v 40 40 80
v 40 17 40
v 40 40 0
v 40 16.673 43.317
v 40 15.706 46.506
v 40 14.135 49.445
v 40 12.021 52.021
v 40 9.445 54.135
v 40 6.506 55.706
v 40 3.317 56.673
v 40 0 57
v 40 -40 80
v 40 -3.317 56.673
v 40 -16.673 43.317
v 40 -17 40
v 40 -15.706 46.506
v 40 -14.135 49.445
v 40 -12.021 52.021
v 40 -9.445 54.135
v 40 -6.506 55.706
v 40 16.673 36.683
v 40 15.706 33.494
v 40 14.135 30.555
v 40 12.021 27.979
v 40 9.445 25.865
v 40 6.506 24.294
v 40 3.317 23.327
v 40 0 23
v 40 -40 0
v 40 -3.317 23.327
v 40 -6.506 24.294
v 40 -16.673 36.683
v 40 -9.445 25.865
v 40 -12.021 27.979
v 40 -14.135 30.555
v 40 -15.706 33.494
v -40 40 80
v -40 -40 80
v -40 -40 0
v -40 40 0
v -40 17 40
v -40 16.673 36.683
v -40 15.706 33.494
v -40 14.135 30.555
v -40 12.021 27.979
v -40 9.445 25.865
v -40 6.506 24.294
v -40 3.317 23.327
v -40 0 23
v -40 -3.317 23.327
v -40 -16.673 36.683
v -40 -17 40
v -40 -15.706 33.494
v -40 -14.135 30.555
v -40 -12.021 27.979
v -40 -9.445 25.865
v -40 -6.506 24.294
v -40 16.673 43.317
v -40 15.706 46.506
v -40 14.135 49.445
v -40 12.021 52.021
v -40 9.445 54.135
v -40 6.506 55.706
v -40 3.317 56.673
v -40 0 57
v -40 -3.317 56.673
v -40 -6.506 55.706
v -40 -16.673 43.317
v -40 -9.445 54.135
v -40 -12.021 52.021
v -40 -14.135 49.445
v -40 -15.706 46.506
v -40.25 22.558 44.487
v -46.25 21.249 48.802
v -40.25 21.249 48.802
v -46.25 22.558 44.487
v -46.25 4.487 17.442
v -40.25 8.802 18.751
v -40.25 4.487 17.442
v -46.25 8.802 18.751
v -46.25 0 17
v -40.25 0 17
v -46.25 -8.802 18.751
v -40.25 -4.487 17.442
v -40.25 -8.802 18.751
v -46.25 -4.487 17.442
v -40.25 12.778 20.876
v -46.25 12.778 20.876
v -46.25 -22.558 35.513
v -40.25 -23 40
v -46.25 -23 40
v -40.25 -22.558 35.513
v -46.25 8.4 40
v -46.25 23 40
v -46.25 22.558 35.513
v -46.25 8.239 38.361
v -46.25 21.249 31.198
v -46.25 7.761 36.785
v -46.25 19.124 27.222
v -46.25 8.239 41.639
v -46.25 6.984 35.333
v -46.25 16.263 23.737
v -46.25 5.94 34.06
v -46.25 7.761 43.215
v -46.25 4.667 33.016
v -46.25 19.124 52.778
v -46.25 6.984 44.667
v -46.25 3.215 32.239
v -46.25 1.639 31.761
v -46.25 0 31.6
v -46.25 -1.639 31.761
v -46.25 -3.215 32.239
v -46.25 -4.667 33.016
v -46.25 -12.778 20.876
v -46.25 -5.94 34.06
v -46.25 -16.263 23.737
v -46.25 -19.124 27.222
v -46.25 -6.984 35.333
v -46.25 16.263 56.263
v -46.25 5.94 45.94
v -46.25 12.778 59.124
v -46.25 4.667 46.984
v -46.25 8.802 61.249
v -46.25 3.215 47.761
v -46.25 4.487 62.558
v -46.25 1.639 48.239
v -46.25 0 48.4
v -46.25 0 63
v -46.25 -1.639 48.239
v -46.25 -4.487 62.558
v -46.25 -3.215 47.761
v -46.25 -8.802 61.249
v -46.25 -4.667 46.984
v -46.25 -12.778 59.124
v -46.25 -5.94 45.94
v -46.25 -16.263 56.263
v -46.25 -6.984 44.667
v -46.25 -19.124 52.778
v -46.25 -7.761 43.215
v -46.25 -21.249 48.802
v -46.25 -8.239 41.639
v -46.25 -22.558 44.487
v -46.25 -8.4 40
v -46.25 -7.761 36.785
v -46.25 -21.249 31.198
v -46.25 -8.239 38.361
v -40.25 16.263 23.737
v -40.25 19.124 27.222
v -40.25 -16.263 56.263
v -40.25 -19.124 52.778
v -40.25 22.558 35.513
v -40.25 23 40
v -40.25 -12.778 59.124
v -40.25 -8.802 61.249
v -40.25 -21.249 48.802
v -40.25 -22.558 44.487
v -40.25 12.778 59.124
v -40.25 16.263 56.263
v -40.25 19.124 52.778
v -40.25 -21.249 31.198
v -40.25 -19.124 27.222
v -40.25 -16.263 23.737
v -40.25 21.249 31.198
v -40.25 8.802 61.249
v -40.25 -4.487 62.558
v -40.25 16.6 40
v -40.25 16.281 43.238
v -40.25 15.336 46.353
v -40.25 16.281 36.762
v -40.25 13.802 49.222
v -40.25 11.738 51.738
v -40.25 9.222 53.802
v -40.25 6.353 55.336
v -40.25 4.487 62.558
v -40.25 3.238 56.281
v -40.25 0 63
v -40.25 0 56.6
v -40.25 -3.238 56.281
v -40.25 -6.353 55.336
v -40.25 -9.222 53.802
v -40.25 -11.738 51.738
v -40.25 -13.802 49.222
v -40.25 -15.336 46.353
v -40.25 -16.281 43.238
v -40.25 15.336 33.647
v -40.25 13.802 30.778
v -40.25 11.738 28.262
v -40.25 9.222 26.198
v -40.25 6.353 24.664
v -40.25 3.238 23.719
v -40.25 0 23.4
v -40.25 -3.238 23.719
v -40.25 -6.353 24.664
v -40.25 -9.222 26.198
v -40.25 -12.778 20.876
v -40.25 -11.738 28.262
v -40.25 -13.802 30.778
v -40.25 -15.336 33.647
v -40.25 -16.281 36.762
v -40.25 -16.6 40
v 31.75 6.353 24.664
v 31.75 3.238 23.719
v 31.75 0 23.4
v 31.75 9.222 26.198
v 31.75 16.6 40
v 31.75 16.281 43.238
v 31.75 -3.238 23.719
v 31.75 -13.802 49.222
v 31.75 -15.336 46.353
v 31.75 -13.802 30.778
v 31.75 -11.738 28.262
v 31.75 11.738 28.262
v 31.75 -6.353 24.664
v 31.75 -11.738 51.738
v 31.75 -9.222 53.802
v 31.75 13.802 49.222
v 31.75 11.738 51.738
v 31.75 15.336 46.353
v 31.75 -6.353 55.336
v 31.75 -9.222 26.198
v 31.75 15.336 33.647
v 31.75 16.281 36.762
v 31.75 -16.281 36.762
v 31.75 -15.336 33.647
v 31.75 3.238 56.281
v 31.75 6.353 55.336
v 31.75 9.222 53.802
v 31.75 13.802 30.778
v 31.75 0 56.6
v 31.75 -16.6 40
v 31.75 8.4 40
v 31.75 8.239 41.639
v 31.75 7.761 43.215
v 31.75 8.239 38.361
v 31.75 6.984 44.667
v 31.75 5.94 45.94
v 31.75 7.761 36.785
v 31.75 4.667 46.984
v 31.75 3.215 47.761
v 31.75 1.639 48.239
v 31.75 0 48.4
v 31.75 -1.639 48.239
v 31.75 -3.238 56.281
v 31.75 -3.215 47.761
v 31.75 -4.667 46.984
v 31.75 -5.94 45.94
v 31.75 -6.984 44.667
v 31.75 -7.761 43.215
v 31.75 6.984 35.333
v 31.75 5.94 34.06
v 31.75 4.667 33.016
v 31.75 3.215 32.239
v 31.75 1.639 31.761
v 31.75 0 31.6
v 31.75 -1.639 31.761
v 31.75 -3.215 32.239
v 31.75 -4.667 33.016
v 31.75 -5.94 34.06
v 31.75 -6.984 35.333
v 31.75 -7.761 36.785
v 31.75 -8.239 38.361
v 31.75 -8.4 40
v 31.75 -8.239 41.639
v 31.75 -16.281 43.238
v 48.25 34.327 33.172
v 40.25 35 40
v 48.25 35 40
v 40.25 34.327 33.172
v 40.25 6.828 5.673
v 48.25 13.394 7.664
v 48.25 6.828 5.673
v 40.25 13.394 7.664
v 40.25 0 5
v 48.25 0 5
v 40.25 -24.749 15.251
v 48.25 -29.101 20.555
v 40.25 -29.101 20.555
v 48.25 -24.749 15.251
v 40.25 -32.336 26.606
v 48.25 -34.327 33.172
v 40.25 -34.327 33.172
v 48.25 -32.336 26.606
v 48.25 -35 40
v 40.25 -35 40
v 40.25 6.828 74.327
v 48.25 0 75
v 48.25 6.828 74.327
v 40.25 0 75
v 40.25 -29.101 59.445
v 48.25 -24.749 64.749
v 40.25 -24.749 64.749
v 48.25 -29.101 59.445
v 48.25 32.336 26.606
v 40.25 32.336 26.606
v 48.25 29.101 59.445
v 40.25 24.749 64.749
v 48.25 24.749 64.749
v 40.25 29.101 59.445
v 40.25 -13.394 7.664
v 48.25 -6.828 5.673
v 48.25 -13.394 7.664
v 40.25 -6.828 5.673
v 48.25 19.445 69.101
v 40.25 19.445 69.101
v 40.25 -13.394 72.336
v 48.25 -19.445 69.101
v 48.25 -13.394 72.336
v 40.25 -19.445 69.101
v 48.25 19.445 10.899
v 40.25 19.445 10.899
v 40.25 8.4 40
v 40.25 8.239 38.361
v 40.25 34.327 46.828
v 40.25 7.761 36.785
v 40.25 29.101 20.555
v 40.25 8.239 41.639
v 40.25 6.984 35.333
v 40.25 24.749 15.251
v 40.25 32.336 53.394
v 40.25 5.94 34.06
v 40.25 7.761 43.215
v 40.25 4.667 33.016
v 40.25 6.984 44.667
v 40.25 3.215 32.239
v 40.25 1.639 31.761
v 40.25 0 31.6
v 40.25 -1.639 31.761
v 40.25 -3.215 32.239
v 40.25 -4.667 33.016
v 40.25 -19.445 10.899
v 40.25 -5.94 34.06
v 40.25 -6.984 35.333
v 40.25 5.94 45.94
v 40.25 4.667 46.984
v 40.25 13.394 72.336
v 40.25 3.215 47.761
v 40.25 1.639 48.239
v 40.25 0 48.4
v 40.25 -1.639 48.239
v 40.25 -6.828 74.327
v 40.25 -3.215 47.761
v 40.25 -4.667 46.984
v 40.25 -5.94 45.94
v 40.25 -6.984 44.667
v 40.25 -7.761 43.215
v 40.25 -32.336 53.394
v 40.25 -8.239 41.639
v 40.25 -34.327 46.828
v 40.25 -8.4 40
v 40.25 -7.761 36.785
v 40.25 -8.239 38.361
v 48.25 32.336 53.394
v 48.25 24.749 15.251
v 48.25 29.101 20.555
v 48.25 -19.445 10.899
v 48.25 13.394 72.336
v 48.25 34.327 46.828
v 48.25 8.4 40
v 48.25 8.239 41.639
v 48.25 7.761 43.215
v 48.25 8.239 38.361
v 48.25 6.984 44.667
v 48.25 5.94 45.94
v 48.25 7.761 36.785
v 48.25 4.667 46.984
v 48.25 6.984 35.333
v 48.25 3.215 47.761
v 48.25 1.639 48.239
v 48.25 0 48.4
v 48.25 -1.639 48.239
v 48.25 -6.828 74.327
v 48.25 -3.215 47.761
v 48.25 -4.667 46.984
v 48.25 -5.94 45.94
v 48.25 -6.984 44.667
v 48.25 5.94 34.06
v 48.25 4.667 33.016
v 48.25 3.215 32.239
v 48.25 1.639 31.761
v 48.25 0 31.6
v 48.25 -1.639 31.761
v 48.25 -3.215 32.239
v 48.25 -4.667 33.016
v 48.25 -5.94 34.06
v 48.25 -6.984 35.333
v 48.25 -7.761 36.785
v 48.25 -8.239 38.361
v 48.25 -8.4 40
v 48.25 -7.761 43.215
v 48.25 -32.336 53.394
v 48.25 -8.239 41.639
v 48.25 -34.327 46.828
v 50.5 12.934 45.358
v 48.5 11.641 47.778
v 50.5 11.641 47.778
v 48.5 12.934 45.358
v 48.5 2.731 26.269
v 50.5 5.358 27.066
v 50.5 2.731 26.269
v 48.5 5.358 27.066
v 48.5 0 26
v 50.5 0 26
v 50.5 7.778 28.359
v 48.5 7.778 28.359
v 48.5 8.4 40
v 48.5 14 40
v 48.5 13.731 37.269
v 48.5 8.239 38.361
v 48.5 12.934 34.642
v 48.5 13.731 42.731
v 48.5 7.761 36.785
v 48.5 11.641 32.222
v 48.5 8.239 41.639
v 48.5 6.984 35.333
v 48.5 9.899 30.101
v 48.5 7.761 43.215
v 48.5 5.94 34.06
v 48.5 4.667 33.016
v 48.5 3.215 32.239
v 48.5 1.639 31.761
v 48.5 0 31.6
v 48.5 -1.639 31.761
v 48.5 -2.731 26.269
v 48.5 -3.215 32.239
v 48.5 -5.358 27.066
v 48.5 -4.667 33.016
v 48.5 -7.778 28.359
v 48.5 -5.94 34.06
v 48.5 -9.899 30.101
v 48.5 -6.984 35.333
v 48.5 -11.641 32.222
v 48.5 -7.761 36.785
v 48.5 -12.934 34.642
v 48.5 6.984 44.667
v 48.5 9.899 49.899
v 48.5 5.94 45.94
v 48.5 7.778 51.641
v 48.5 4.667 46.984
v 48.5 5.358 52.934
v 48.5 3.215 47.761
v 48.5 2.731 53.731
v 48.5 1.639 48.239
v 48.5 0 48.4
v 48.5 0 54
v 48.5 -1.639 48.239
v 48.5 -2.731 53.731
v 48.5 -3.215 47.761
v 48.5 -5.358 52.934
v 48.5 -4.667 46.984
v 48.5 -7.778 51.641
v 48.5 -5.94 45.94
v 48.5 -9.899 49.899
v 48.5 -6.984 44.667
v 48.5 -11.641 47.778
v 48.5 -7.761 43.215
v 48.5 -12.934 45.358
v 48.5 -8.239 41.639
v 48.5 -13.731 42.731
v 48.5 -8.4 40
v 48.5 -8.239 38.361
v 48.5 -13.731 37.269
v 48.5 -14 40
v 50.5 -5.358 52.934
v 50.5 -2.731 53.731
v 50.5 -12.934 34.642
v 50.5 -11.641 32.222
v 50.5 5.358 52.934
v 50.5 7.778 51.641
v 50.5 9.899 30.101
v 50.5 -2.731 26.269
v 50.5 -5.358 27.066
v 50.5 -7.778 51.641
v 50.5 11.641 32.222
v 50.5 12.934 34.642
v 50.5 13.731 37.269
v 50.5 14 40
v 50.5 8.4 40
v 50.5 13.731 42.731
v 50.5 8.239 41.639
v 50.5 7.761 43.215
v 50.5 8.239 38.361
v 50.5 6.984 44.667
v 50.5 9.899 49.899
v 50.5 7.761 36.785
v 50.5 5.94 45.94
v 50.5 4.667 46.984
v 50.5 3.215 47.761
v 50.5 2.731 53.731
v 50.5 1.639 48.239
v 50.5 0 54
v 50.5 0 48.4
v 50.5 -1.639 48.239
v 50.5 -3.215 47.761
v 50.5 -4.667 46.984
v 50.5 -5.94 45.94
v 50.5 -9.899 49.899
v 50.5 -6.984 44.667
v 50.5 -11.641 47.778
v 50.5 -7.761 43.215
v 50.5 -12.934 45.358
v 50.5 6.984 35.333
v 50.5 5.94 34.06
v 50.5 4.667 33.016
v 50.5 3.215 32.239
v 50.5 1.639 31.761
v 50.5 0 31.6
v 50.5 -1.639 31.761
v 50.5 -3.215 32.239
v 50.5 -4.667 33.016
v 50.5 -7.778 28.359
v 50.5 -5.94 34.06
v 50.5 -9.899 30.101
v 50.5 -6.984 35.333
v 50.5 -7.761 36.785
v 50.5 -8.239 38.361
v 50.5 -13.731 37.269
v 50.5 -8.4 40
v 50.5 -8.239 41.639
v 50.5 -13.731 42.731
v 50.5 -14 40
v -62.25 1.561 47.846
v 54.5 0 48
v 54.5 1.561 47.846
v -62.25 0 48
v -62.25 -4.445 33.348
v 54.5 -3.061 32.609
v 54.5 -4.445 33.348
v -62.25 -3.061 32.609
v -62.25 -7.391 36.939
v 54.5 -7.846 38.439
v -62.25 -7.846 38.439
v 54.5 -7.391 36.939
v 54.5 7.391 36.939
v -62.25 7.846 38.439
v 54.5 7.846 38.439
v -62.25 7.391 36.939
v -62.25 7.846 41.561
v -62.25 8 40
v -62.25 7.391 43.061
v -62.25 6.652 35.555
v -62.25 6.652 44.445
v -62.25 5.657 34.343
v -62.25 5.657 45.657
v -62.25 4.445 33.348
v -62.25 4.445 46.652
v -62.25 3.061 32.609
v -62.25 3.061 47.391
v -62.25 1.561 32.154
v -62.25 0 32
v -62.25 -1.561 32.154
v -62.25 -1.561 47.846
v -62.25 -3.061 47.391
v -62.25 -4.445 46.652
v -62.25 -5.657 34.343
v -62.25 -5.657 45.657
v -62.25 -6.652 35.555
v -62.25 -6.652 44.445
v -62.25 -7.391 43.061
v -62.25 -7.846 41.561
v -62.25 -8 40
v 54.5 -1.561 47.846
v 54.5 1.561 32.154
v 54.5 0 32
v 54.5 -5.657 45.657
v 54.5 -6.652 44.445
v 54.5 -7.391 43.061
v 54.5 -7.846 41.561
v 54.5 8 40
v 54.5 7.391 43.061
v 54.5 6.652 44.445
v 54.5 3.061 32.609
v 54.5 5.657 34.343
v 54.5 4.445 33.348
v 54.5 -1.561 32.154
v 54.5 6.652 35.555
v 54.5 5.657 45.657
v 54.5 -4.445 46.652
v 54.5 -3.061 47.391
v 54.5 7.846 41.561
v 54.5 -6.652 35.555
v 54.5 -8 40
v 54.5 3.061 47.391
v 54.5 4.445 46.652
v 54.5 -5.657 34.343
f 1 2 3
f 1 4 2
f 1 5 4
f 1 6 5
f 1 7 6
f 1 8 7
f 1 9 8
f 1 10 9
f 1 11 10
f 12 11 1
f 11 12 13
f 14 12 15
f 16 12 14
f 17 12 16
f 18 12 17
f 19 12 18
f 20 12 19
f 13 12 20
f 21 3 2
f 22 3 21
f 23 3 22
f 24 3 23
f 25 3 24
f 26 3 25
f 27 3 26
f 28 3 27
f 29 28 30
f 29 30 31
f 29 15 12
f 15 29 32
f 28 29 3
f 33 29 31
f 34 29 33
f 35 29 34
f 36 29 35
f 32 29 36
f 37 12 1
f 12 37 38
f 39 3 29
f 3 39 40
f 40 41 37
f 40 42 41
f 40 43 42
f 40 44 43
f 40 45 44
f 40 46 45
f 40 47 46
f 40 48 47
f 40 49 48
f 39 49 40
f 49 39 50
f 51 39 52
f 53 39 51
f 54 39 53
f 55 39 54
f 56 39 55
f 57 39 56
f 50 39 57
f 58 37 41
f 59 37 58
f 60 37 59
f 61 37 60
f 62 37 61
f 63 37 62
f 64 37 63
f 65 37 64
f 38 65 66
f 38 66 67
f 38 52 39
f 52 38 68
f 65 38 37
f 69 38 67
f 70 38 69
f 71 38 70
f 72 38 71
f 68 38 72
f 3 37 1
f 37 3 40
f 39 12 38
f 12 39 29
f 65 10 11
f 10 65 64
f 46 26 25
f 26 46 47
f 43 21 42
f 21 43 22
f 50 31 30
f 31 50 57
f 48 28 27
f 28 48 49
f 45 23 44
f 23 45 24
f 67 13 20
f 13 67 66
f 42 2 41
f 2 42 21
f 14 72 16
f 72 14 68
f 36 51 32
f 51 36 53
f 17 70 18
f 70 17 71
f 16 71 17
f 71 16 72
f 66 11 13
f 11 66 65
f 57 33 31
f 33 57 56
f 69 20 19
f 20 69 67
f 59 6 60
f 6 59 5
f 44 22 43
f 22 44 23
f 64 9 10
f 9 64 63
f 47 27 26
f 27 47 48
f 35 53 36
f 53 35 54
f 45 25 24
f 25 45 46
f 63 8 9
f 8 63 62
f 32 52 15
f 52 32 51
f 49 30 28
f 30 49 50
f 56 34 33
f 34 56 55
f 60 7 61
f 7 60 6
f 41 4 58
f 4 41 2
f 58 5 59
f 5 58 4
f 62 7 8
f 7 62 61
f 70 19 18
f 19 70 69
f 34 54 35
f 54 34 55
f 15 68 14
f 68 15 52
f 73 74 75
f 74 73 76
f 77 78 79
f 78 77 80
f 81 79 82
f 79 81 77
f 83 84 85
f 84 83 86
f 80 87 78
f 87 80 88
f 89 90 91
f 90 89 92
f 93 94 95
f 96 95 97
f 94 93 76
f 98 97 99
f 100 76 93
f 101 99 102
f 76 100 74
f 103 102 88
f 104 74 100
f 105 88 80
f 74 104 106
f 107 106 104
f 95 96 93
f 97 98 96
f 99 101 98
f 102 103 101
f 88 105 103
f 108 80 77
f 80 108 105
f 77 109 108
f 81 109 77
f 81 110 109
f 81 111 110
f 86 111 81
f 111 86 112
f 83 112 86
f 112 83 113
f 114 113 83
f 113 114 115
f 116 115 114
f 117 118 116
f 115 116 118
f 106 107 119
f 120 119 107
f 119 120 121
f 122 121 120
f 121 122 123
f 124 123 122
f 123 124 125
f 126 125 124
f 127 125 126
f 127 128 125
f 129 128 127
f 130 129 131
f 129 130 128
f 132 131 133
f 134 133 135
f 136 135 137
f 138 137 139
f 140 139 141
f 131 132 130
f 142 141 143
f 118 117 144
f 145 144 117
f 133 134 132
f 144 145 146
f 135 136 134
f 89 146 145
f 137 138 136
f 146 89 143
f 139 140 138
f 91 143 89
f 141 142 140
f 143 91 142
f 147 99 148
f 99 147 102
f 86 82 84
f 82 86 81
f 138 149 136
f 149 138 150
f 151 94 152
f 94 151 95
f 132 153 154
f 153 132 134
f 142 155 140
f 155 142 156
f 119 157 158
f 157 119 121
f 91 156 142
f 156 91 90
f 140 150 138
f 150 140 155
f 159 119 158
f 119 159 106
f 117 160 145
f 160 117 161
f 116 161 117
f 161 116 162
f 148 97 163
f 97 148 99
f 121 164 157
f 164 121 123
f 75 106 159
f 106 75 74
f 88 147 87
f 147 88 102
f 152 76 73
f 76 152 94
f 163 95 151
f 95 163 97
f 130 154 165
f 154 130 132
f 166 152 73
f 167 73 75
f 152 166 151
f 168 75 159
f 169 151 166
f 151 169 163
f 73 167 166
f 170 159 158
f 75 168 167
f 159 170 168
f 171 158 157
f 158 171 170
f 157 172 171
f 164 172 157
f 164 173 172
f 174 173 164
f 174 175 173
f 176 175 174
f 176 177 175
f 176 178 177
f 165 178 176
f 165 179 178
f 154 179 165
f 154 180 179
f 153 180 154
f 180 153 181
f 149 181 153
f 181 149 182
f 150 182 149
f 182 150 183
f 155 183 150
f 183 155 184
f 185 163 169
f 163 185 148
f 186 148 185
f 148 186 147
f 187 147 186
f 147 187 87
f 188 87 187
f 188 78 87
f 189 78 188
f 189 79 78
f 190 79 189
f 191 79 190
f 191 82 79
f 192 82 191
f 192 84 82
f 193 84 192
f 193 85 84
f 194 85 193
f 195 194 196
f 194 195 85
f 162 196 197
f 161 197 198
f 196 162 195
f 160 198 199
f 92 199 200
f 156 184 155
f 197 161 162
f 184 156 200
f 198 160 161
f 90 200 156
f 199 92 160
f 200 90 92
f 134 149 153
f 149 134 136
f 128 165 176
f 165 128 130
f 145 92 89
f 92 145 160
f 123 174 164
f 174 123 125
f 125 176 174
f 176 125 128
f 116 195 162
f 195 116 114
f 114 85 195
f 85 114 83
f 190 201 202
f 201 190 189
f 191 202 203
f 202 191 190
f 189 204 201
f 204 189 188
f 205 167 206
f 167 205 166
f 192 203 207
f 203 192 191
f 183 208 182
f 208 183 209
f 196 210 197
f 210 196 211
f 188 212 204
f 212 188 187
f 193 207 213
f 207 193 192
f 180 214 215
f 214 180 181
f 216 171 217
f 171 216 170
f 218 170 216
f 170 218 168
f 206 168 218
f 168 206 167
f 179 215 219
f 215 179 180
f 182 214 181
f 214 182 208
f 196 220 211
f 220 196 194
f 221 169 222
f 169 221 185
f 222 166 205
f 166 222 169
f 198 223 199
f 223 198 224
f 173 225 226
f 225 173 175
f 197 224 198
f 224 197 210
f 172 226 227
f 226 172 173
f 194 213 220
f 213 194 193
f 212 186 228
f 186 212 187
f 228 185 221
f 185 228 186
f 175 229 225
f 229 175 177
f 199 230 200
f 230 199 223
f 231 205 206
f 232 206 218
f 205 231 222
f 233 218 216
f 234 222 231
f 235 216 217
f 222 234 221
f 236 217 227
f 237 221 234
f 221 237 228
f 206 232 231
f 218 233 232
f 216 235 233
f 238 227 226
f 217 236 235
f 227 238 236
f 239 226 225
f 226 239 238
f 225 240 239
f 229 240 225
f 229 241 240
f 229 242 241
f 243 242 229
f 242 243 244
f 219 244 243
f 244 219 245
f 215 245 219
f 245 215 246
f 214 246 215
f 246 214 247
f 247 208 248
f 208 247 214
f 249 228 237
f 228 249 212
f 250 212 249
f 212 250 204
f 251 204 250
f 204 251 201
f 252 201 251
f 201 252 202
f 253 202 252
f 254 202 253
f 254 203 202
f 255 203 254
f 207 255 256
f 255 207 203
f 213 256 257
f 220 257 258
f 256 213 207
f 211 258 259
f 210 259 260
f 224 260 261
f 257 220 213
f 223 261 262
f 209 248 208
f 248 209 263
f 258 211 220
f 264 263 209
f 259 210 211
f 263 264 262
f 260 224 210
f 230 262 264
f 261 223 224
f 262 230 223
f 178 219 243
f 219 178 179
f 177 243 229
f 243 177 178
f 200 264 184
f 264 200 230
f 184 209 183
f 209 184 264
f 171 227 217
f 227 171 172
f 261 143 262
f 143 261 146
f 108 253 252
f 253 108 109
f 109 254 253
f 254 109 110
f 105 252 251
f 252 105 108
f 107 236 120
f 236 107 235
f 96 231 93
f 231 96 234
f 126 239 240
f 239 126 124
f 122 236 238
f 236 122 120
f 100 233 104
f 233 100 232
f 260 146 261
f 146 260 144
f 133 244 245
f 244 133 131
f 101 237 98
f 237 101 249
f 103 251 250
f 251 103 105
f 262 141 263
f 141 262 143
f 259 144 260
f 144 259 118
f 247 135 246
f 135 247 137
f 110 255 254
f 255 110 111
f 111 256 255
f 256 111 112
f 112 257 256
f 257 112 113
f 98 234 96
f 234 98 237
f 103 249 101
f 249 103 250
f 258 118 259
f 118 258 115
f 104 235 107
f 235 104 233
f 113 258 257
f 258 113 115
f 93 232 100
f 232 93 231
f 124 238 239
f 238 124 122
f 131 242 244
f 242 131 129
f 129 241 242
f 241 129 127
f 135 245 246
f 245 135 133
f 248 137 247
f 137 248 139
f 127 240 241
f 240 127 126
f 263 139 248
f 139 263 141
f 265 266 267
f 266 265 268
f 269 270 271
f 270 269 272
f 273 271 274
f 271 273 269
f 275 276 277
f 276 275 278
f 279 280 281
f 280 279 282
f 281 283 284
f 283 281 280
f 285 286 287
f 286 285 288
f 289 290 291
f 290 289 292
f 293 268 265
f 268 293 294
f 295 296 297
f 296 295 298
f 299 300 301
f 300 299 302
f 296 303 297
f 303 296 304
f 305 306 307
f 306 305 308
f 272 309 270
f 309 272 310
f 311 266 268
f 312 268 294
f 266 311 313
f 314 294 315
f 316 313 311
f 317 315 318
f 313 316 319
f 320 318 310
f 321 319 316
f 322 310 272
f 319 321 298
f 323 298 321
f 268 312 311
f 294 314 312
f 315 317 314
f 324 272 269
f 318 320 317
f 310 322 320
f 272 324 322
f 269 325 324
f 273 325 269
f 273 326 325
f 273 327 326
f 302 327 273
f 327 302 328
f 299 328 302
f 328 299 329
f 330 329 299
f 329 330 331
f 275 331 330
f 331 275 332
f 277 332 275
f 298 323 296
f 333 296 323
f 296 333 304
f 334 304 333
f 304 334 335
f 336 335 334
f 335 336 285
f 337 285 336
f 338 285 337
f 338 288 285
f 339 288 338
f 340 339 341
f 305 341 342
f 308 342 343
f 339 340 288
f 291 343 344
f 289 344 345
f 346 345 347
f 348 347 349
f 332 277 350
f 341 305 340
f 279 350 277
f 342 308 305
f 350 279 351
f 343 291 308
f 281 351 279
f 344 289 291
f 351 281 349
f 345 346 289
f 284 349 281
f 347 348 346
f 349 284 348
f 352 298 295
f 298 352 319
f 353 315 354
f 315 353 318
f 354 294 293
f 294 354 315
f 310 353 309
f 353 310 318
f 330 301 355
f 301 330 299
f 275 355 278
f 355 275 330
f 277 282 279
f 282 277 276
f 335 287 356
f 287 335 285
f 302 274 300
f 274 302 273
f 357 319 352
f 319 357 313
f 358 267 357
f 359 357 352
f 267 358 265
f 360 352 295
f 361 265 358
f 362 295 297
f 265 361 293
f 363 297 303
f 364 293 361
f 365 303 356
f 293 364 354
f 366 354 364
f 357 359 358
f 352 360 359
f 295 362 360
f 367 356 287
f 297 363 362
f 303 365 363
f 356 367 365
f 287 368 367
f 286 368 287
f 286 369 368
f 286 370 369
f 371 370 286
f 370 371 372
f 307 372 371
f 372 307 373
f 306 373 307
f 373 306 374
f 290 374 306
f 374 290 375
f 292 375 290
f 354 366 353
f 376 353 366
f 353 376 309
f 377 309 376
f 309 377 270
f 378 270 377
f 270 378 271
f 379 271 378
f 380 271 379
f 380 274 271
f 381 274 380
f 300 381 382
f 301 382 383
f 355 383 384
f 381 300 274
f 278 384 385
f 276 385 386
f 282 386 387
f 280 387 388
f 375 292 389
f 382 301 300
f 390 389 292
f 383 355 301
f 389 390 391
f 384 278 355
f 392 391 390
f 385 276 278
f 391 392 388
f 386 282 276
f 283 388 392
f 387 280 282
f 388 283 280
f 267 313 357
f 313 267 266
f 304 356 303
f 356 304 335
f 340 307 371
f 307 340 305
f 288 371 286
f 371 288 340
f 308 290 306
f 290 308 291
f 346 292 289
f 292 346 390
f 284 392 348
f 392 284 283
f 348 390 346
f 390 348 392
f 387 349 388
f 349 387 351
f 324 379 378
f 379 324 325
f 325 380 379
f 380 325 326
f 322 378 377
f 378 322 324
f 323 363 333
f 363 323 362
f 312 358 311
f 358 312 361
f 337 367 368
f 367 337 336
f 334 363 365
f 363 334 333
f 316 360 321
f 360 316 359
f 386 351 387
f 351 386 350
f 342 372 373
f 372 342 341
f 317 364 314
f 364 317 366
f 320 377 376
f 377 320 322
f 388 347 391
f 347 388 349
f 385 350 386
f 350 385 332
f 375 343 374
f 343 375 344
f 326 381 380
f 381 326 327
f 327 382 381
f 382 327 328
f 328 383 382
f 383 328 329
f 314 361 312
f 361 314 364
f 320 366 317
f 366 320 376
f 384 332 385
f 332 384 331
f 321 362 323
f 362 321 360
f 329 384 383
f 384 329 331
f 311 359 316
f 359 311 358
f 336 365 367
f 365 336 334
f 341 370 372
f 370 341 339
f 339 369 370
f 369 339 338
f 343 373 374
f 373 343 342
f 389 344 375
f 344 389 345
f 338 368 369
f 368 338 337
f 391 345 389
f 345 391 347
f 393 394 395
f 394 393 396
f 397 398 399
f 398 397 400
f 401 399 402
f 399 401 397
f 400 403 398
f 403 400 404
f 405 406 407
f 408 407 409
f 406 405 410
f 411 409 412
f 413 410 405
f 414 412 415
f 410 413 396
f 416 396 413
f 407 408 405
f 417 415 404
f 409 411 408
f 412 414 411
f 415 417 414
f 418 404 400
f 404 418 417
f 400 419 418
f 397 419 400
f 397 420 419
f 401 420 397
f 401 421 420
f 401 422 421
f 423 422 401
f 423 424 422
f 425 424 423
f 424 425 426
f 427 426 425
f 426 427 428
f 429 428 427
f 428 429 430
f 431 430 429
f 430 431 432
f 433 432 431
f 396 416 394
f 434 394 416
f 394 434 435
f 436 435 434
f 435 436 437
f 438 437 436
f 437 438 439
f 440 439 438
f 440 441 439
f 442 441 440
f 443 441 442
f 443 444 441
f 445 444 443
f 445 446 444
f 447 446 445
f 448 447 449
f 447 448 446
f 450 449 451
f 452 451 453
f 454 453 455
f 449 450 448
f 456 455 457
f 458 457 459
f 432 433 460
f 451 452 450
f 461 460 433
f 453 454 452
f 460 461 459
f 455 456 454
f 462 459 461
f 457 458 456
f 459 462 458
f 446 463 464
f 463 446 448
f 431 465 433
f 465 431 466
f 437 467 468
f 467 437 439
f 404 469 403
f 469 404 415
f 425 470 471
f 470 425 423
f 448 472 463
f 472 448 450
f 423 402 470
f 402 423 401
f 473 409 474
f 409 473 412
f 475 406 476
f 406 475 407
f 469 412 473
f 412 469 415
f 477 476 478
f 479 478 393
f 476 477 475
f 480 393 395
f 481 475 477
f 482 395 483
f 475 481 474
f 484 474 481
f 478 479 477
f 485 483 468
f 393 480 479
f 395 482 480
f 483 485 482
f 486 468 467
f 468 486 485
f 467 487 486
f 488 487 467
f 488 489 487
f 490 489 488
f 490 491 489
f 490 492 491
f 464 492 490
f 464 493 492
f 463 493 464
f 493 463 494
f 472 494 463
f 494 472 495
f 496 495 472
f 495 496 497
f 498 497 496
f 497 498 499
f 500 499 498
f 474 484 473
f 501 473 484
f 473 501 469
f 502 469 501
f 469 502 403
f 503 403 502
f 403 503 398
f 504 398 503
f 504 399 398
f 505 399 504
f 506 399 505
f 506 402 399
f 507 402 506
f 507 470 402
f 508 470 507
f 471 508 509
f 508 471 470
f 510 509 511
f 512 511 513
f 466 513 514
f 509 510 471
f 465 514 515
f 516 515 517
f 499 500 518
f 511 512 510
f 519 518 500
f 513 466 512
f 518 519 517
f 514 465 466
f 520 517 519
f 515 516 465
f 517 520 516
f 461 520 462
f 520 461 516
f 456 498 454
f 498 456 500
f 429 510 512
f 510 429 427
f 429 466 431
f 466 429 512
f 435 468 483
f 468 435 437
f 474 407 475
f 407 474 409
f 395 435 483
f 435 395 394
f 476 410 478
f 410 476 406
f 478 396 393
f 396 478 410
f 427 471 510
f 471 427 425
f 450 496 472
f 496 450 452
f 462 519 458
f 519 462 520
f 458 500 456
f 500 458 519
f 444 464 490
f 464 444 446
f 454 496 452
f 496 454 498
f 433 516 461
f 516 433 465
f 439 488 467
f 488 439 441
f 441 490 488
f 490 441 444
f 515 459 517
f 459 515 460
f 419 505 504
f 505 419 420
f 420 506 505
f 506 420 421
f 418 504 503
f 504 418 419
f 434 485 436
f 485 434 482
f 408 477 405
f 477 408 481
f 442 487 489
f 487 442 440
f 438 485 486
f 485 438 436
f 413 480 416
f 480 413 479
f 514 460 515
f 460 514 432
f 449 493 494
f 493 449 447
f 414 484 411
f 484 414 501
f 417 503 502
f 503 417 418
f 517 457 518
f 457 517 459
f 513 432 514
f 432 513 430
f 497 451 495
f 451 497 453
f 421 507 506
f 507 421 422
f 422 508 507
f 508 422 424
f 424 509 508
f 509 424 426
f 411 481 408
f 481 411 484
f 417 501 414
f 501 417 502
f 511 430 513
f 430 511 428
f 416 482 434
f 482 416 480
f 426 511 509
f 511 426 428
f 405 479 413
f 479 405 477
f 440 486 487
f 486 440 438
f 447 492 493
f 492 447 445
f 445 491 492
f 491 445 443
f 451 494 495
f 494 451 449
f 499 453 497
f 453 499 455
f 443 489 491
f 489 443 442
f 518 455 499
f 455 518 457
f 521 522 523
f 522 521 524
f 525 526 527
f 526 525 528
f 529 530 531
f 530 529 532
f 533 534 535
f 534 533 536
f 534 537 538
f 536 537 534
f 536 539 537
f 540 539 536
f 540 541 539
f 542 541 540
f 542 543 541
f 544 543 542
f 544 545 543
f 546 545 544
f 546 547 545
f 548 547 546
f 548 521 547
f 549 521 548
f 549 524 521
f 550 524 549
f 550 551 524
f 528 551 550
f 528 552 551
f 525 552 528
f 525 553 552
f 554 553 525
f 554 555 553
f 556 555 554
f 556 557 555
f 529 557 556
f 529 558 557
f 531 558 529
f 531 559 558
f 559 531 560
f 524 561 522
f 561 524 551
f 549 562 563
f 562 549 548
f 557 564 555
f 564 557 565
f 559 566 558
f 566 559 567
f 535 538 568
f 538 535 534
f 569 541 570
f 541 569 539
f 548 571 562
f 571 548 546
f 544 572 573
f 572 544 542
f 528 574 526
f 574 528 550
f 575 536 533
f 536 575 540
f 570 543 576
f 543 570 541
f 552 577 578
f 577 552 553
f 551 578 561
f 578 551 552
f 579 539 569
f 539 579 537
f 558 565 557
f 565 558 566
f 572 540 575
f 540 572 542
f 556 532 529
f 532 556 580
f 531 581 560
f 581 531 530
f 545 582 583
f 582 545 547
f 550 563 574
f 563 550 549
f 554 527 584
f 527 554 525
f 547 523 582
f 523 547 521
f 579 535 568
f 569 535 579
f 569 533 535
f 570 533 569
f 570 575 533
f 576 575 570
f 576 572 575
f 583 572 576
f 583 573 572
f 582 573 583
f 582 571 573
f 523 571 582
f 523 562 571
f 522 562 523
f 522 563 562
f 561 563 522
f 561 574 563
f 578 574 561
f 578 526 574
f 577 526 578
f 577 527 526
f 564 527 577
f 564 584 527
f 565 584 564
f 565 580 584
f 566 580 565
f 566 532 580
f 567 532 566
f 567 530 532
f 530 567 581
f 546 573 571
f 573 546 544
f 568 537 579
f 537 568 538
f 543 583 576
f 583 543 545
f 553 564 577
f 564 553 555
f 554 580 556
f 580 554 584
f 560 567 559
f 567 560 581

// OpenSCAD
$fn = 32;

// ------------------------------------------------------------------------
// Bushed housing: 80 x 80 x 80 mm housing, bushing d33.2
// Every part is its own module, assembly() places them once.
// ------------------------------------------------------------------------

// --- part 1 ---
module housing() {
  difference() {
    translate([-40, -40, 0]) cube([80, 80, 80]);
    translate([0, 0, 40]) rotate([0, 90, 0]) cylinder(h = 82, d = 34, center = true);
  }
}

// --- part 2 ---
module bushing() {
  difference() {
    union() {
      cylinder(h = 6, d = 46);
      translate([0, 0, 6]) cylinder(h = 72, d = 33.2);
    }
    translate([0, 0, -1]) cylinder(h = 80, d = 16.8);
  }
}

// --- part 3 ---
module shaft() {
  translate([0, 0, -58.375]) cylinder(h = 116.75, d = 16);
}

// --- part 4 ---
module cover() {
  difference() {
    cylinder(h = 8, d = 70);
    translate([0, 0, -1]) cylinder(h = 10, d = 16.8);
  }
}

// --- part 5 ---
module washer() {
  difference() {
      translate([0, 0, 0]) cylinder(h = 2, d = 28);
      translate([0, 0, -1]) cylinder(h = 4, d = 16.8);
    }
}

// --- assembly ---
module assembly() {
  translate([0, 0, 0]) rotate([0, 0, 0]) housing();
  translate([-46.25, 0, 40]) rotate([0, 90, 0]) bushing();
  translate([-3.875, 0, 40]) rotate([0, 90, 0]) shaft();
  translate([40.25, 0, 40]) rotate([0, 90, 0]) cover();
  translate([48.5, 0, 40]) rotate([0, 90, 0]) washer();
}

assembly();
